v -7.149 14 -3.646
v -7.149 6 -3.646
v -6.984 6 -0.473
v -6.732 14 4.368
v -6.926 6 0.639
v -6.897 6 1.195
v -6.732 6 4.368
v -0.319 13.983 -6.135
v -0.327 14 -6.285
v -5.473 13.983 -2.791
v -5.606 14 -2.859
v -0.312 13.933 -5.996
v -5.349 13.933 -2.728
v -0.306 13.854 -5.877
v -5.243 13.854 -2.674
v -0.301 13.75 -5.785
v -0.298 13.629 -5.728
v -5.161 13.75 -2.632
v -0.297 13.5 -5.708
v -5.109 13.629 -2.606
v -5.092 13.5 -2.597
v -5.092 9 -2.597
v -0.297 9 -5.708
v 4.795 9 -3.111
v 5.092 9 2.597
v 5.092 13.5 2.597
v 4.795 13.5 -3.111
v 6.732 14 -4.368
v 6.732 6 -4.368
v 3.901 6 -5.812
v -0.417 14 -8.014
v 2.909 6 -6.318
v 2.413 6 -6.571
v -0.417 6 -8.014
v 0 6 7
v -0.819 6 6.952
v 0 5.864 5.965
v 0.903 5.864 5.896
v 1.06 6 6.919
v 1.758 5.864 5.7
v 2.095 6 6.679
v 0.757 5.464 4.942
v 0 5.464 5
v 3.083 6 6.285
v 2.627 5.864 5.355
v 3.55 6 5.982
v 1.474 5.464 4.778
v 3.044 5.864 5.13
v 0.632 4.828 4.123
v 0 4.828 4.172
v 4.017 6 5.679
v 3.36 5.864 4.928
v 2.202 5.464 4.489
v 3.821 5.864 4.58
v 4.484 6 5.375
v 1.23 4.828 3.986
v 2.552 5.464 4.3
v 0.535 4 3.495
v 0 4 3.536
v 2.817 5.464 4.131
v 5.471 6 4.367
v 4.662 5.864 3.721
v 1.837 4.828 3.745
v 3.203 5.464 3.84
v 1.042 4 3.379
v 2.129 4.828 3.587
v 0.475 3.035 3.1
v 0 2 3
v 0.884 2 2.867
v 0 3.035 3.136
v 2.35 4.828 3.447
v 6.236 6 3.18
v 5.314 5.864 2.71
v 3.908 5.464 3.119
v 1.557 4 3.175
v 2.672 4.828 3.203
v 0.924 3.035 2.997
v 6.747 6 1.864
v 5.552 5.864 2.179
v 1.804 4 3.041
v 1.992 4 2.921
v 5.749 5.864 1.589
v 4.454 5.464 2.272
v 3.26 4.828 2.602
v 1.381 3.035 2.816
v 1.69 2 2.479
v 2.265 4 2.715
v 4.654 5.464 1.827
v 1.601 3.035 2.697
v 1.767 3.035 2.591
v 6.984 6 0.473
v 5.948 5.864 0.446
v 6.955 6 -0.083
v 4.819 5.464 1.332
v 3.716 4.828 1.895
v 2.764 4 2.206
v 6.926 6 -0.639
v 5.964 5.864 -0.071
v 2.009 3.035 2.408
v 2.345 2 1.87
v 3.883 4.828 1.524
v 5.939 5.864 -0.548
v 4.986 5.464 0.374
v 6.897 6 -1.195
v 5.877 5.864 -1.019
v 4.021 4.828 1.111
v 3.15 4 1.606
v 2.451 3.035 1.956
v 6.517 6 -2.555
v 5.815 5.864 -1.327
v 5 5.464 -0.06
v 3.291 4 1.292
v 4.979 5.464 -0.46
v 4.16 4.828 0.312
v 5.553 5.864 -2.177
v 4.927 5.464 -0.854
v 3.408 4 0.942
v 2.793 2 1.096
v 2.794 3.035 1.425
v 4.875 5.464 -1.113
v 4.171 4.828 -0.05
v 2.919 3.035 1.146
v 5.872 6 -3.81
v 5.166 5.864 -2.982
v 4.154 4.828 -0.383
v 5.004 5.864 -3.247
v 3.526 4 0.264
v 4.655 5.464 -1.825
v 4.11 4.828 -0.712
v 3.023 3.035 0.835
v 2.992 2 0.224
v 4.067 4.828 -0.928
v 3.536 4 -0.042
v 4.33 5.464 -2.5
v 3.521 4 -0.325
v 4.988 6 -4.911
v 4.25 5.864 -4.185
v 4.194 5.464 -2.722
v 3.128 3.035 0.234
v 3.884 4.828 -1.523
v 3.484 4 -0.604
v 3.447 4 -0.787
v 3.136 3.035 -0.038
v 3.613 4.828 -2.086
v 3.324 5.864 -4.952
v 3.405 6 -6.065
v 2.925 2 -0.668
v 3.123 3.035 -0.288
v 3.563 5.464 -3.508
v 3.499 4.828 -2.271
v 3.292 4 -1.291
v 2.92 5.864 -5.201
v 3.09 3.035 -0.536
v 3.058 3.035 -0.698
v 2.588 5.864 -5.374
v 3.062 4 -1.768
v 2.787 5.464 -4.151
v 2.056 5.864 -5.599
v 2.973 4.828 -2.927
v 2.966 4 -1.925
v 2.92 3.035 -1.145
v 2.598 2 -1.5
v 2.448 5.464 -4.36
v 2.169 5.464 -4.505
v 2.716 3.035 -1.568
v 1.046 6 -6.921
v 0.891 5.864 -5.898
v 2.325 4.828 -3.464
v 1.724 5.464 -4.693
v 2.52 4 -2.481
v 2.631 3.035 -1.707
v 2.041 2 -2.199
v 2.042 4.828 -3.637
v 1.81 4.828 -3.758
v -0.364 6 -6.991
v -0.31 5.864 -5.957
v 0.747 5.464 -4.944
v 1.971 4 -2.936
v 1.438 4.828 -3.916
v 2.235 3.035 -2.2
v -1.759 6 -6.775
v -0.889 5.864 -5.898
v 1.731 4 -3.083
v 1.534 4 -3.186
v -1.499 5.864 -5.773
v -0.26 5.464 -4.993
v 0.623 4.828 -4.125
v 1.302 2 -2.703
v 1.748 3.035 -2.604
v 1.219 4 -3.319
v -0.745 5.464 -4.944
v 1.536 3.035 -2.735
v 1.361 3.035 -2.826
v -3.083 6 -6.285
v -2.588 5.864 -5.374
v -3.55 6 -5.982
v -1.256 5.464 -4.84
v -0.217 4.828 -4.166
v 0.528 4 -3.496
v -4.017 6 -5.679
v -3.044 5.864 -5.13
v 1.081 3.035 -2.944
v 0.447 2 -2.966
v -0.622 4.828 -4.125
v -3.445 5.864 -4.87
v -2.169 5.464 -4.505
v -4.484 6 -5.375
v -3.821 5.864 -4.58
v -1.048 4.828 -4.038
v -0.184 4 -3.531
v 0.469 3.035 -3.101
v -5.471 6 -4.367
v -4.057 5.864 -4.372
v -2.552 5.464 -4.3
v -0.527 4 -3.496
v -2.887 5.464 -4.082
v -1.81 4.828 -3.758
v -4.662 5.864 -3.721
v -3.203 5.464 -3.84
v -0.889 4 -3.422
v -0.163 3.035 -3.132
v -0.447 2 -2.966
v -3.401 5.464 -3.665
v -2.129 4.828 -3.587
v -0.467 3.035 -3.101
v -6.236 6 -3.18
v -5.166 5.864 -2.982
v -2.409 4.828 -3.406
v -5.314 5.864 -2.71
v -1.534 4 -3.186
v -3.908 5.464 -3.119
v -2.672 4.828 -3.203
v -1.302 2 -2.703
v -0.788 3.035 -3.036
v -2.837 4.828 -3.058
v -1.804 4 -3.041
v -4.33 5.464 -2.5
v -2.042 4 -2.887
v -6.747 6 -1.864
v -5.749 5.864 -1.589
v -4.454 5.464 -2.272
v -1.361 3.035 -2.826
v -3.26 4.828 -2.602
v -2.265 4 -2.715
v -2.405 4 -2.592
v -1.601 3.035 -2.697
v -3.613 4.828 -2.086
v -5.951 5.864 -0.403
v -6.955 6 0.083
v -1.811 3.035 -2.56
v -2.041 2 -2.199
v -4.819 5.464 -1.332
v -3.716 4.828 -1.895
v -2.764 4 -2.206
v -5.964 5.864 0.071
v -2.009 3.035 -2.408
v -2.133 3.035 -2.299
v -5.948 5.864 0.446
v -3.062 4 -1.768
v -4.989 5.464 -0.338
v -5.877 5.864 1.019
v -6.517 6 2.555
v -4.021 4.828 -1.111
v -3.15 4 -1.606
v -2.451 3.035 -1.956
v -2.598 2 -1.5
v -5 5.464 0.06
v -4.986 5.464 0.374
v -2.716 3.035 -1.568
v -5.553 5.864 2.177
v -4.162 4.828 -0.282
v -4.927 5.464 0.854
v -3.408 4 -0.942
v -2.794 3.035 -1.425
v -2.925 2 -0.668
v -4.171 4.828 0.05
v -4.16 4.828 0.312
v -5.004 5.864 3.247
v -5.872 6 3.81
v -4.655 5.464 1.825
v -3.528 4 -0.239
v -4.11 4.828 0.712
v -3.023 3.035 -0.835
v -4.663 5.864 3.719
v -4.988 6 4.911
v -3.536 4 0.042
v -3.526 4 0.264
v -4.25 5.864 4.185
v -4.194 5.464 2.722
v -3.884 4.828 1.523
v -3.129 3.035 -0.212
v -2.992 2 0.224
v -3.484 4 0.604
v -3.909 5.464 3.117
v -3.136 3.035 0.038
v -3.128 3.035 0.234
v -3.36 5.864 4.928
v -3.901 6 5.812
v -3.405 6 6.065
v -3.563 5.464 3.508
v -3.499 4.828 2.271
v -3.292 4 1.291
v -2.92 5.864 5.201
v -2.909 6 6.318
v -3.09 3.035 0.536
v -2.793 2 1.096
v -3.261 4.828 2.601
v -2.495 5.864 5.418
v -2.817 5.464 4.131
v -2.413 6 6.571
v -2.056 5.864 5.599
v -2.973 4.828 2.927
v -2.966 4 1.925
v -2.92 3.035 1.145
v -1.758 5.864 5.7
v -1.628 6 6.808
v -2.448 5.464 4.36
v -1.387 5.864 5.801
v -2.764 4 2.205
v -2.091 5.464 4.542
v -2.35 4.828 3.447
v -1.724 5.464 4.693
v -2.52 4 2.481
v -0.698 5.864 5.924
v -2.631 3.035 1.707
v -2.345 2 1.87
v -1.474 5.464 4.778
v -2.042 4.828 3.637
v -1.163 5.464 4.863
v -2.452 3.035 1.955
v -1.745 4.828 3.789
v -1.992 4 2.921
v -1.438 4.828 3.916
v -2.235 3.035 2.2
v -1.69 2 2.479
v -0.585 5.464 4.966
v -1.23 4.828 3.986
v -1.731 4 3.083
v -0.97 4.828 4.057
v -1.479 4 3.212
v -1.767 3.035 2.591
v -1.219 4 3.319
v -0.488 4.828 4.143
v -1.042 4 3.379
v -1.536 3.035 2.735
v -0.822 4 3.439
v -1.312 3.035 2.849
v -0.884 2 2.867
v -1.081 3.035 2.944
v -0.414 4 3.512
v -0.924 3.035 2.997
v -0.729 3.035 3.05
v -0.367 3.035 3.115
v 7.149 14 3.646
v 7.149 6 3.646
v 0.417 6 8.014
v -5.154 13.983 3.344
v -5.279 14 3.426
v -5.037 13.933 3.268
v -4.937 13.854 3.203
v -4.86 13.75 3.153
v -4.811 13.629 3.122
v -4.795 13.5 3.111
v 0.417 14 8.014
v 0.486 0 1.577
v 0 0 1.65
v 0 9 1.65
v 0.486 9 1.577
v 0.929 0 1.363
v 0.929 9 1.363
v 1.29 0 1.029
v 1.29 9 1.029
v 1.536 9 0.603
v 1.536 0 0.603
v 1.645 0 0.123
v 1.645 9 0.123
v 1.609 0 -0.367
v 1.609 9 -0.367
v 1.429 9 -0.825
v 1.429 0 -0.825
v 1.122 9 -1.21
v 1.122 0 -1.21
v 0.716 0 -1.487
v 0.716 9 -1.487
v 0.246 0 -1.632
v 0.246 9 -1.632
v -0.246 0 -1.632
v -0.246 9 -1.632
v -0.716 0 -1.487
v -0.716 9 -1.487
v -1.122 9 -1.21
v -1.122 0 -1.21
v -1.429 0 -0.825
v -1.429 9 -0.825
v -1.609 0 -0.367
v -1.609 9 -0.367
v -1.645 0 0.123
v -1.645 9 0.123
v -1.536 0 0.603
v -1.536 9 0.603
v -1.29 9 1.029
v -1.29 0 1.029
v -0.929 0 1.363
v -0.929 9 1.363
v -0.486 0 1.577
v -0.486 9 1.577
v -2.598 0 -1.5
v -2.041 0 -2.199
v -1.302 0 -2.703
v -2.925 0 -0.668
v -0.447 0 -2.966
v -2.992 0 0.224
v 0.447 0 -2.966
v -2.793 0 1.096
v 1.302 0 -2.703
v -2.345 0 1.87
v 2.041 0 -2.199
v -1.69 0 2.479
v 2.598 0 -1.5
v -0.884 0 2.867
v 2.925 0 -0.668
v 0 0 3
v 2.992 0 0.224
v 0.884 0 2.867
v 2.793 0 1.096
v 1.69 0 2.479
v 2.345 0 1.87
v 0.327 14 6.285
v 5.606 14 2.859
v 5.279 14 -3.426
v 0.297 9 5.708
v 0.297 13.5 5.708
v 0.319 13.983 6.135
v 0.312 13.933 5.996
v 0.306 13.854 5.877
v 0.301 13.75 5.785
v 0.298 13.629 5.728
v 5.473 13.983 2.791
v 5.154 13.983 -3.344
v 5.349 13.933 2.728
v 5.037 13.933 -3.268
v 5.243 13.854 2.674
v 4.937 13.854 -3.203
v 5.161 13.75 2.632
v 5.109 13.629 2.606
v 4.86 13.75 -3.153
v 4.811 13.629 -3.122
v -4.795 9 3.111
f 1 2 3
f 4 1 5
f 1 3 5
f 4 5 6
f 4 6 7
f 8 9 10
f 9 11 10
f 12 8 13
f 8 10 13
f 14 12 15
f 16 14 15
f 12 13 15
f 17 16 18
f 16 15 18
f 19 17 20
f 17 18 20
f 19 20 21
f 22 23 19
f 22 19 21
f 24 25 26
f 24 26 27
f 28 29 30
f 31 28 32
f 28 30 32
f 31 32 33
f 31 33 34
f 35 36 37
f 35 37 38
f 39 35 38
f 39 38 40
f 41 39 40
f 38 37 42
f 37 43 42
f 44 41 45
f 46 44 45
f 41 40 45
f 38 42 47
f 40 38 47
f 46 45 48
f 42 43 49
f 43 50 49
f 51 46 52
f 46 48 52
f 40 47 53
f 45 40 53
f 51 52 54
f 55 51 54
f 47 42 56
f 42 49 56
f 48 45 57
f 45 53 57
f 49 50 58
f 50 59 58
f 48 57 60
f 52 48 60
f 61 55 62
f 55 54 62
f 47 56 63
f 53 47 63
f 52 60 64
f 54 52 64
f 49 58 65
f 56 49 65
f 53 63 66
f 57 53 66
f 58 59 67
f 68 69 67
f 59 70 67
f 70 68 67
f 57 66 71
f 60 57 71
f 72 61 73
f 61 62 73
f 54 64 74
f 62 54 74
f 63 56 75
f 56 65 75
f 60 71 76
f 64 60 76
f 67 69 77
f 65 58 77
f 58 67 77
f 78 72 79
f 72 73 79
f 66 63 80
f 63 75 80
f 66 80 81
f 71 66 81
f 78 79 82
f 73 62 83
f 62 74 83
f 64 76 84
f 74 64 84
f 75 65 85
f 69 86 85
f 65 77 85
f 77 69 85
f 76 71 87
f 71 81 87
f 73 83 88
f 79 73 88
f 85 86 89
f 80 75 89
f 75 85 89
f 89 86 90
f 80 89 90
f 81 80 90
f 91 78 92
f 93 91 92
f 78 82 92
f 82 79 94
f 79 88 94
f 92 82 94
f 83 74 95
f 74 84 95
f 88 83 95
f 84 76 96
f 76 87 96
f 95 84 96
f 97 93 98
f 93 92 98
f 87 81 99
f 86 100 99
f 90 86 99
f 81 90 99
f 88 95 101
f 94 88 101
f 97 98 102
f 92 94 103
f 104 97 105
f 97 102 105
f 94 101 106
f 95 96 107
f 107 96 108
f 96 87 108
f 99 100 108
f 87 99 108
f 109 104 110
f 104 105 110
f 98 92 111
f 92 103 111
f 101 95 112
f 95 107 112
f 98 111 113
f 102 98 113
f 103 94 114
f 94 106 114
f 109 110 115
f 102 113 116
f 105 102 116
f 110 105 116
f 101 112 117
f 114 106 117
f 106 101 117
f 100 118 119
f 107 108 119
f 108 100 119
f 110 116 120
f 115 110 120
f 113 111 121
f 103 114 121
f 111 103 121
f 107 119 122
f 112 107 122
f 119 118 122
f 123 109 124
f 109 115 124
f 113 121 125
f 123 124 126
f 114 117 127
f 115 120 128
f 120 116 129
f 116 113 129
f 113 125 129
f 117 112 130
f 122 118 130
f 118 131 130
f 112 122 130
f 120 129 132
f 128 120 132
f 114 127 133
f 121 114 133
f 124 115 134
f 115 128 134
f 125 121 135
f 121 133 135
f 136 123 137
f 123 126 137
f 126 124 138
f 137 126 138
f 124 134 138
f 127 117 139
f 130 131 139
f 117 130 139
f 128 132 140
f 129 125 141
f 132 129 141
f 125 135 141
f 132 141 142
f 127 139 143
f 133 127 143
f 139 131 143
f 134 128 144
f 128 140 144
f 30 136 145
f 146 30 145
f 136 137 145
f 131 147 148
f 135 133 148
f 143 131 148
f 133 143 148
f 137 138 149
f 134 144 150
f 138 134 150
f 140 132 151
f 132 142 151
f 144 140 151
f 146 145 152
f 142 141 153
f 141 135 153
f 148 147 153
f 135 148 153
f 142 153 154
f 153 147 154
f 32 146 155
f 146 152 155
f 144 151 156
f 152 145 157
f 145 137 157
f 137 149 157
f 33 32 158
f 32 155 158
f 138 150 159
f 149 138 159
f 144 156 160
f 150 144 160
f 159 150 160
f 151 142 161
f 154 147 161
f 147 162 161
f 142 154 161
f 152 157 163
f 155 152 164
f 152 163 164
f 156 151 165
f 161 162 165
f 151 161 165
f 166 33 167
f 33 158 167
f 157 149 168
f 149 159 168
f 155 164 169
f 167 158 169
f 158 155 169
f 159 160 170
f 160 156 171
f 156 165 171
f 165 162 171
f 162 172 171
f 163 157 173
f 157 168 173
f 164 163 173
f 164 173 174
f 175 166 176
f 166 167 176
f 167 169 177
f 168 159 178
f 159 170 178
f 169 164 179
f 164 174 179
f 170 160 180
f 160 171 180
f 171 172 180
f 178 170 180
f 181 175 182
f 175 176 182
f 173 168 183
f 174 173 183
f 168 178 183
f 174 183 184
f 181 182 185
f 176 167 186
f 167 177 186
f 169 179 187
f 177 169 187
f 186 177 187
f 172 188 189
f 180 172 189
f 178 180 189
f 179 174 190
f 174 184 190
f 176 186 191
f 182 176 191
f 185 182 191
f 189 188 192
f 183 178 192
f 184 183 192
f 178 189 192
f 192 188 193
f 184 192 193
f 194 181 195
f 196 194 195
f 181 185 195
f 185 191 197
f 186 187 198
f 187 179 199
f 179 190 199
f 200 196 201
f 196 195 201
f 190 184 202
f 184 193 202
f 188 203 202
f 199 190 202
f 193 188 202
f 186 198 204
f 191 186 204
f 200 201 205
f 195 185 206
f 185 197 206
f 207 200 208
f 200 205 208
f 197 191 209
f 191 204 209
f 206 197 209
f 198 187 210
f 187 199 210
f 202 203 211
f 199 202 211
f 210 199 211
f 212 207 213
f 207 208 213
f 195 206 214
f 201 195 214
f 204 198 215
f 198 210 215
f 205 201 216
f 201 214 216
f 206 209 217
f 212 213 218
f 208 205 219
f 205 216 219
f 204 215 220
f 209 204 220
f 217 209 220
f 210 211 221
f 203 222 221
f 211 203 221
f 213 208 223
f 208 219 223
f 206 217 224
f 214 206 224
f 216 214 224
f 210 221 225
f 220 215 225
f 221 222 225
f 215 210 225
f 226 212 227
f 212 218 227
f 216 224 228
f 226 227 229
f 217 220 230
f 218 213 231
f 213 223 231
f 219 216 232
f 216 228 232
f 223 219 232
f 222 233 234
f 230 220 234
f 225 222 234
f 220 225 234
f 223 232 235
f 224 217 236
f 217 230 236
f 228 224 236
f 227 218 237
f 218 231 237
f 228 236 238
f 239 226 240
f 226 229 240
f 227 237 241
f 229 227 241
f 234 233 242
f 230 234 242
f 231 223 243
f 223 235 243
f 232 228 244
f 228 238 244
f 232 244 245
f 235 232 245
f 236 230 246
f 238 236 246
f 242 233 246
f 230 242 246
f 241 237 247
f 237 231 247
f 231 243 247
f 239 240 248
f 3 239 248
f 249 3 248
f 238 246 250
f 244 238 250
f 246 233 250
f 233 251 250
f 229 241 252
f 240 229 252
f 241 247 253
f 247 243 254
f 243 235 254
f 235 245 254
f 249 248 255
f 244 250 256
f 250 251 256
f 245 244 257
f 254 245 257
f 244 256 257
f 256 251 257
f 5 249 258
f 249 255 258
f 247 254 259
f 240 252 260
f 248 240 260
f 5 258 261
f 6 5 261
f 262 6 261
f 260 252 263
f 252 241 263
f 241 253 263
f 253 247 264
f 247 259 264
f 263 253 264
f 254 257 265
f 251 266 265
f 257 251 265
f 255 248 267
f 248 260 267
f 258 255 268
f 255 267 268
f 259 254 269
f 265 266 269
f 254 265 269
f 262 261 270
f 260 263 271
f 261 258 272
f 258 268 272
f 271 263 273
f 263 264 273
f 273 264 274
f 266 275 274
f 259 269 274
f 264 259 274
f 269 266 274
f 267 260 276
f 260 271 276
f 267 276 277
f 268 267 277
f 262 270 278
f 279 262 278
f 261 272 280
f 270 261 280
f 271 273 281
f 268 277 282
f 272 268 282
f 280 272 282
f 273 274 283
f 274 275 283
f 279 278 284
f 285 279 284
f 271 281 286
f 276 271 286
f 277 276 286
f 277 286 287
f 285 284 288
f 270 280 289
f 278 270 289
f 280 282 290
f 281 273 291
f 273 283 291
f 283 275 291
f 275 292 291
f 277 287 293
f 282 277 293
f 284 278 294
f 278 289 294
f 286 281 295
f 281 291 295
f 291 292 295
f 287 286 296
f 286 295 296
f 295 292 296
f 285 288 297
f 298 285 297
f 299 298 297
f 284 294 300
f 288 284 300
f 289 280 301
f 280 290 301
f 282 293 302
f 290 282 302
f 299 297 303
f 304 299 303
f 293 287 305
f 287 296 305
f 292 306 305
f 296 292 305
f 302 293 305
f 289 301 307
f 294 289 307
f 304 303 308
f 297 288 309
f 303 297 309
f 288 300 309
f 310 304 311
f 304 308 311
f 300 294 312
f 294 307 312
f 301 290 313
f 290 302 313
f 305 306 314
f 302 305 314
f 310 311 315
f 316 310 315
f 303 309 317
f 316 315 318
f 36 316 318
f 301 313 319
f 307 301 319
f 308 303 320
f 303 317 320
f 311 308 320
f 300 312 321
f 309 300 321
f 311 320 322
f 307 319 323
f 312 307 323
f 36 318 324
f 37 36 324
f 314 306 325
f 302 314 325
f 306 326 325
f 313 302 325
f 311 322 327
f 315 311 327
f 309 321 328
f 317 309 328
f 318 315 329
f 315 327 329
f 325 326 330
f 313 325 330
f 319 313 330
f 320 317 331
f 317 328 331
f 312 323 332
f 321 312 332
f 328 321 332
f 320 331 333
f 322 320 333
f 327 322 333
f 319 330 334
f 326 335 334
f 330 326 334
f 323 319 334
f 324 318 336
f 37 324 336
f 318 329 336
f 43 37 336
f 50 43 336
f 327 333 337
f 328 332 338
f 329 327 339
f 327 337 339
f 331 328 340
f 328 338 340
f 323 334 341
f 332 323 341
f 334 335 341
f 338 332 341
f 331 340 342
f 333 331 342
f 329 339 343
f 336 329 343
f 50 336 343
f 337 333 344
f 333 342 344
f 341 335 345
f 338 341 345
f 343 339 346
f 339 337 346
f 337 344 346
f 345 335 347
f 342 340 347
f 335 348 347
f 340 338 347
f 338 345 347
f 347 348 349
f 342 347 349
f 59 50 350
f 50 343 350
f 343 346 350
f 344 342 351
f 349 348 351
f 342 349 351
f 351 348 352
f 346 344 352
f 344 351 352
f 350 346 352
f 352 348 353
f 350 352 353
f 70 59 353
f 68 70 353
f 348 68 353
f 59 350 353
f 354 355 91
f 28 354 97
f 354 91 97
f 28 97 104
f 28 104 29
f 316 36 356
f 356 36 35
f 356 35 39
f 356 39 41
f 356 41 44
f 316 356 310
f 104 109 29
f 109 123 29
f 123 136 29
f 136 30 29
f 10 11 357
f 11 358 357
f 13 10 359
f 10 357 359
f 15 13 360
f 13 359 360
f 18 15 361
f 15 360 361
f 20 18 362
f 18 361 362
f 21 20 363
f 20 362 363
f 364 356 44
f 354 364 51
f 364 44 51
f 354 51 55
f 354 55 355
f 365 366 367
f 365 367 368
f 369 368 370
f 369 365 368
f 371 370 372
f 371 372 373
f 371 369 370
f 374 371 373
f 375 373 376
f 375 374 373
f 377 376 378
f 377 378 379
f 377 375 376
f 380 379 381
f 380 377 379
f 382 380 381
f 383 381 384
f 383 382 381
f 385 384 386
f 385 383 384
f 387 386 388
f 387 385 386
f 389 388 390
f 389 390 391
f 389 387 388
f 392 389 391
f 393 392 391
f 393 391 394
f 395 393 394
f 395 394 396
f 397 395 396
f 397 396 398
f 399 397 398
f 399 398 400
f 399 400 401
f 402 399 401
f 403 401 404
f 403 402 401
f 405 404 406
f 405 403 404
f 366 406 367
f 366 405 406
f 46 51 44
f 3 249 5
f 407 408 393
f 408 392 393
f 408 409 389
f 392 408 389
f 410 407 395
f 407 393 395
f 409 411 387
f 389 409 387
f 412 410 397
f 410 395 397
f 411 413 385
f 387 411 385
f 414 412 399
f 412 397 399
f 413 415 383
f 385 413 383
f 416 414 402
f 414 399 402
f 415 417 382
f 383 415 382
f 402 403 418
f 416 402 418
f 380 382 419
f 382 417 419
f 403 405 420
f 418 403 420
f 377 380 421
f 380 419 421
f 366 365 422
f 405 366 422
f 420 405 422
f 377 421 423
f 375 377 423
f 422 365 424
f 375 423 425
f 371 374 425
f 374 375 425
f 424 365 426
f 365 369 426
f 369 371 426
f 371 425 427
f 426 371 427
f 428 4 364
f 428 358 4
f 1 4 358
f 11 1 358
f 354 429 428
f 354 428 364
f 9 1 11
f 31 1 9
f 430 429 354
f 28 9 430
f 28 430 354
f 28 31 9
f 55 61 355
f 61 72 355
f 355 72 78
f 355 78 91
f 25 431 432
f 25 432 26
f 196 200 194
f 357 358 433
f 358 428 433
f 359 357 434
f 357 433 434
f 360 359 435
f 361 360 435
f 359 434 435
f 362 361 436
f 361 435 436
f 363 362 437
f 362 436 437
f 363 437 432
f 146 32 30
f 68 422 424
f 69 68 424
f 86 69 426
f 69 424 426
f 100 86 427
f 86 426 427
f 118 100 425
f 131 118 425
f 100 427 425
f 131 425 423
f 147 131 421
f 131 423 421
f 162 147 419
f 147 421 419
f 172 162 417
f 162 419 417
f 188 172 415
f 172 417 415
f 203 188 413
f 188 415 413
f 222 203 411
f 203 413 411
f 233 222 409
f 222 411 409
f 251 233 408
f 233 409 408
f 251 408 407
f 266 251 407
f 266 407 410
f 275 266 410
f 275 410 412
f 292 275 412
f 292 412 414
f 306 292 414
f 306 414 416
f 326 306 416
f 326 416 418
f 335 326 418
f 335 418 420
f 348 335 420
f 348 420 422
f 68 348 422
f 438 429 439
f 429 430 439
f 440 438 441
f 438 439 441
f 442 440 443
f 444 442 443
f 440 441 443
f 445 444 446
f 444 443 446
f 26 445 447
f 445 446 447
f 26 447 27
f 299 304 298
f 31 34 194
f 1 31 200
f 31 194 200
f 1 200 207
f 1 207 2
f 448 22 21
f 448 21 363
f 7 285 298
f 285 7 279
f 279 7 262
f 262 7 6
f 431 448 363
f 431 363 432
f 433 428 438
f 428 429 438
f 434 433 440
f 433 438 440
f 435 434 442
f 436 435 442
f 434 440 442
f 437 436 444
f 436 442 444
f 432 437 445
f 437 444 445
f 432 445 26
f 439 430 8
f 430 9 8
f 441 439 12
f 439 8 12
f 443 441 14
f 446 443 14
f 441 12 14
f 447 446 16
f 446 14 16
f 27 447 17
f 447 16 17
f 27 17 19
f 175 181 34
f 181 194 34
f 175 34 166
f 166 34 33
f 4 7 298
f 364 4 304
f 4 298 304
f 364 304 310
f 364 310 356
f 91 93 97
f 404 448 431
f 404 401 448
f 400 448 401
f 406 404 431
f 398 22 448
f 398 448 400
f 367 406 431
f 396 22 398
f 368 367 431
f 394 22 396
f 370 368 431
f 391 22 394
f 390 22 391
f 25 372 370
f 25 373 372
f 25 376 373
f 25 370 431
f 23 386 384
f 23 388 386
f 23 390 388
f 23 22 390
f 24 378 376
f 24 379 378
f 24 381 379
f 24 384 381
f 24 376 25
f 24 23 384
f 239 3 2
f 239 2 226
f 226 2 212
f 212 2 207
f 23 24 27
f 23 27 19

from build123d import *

# Parameters (mm, degrees)
SKETCH1_R           = 3
BOSS_EXTRUDE1_DEPTH = 9
BOSS_EXTRUDE2_DEPTH = 5
BOSS_EXTRUDE3_START = -3
SKETCH2_3_R         = 3
BOSS_EXTRUDE3_DEPTH = 3
FILLET1_R           = 4
FILLET2_R           = 0.5


with BuildPart() as part:
    # Sketch1 → Boss-Extrude1 (new body)
    with BuildSketch(Plane(origin=(0, 0, 0), x_dir=(1, 0, 0), z_dir=(0, 1, 0))):
        Circle(SKETCH1_R)
        with BuildLine():
            ThreePointArc((1.65, 0), (-0.588756448, -1.541384392), (-1.229837388, 1.1))
            ThreePointArc((-1.229837388, 1.1), (0, 1.65), (1.229837388, 1.1))
            ThreePointArc((1.229837388, 1.1), (1.541384392, 0.588756448), (1.65, 0))
        make_face(mode=Mode.SUBTRACT)
    extrude(amount=BOSS_EXTRUDE1_DEPTH)



with BuildPart() as body_2:
    # Sketch2 → Boss-Extrude2 (new body)
    with BuildSketch(Plane(origin=(0, 9, 0), x_dir=(1, 0, 0), z_dir=(0, 1, 0))):
        Polygon((-0.41717713, 8.014318223), (-7.14919174, 3.645873119), (-6.73201461, -4.368445104), (0.41717713, -8.014318223), (7.14919174, -3.645873119), (6.73201461, 4.368445104), align=None)
        Polygon((-4.794744219, -3.111338599), (0.297126157, -5.708039598), (5.091870376, -2.596700998), (4.794744219, 3.111338599), (-0.297126157, 5.708039598), (-5.091870376, 2.596700998), align=None, mode=Mode.SUBTRACT)
    extrude(amount=BOSS_EXTRUDE2_DEPTH)


with BuildPart() as part_1:
    add(part.part)

    add(body_2.part)  # Boss-Extrude3 merges body 2
    # Sketch2<3> → Boss-Extrude3 (add)
    with BuildSketch(Plane(origin=(0, 9, 0), x_dir=(1, 0, 0), z_dir=(0, 1, 0)).offset(BOSS_EXTRUDE3_START)):
        Polygon((6.73201461, 4.368445104), (-0.41717713, 8.014318223), (-7.14919174, 3.645873119), (-6.73201461, -4.368445104), (0.41717713, -8.014318223), (7.14919174, -3.645873119), align=None)
        Circle(SKETCH2_3_R, mode=Mode.SUBTRACT)
    extrude(amount=BOSS_EXTRUDE3_DEPTH)

    # Fillet1
    fillet1_edges = [part_1.edges().sort_by_distance(p)[0] for p in [
        (-3, 6, 0),
    ]]
    fillet(fillet1_edges, radius=FILLET1_R)

    # Fillet2
    fillet2_edges = [part_1.edges().sort_by_distance(p)[0] for p in [
        (4.943307297, 14, -0.2573188),
        (2.694498267, 14, 4.152370298),
        (-2.248809031, 14, 4.409689098),
        (2.248809031, 14, -4.409689098),
        (-2.694498267, 14, -4.152370298),
        (-4.943307297, 14, 0.2573188),
    ]]
    fillet(fillet2_edges, radius=FILLET2_R)


solid = part_1.part
